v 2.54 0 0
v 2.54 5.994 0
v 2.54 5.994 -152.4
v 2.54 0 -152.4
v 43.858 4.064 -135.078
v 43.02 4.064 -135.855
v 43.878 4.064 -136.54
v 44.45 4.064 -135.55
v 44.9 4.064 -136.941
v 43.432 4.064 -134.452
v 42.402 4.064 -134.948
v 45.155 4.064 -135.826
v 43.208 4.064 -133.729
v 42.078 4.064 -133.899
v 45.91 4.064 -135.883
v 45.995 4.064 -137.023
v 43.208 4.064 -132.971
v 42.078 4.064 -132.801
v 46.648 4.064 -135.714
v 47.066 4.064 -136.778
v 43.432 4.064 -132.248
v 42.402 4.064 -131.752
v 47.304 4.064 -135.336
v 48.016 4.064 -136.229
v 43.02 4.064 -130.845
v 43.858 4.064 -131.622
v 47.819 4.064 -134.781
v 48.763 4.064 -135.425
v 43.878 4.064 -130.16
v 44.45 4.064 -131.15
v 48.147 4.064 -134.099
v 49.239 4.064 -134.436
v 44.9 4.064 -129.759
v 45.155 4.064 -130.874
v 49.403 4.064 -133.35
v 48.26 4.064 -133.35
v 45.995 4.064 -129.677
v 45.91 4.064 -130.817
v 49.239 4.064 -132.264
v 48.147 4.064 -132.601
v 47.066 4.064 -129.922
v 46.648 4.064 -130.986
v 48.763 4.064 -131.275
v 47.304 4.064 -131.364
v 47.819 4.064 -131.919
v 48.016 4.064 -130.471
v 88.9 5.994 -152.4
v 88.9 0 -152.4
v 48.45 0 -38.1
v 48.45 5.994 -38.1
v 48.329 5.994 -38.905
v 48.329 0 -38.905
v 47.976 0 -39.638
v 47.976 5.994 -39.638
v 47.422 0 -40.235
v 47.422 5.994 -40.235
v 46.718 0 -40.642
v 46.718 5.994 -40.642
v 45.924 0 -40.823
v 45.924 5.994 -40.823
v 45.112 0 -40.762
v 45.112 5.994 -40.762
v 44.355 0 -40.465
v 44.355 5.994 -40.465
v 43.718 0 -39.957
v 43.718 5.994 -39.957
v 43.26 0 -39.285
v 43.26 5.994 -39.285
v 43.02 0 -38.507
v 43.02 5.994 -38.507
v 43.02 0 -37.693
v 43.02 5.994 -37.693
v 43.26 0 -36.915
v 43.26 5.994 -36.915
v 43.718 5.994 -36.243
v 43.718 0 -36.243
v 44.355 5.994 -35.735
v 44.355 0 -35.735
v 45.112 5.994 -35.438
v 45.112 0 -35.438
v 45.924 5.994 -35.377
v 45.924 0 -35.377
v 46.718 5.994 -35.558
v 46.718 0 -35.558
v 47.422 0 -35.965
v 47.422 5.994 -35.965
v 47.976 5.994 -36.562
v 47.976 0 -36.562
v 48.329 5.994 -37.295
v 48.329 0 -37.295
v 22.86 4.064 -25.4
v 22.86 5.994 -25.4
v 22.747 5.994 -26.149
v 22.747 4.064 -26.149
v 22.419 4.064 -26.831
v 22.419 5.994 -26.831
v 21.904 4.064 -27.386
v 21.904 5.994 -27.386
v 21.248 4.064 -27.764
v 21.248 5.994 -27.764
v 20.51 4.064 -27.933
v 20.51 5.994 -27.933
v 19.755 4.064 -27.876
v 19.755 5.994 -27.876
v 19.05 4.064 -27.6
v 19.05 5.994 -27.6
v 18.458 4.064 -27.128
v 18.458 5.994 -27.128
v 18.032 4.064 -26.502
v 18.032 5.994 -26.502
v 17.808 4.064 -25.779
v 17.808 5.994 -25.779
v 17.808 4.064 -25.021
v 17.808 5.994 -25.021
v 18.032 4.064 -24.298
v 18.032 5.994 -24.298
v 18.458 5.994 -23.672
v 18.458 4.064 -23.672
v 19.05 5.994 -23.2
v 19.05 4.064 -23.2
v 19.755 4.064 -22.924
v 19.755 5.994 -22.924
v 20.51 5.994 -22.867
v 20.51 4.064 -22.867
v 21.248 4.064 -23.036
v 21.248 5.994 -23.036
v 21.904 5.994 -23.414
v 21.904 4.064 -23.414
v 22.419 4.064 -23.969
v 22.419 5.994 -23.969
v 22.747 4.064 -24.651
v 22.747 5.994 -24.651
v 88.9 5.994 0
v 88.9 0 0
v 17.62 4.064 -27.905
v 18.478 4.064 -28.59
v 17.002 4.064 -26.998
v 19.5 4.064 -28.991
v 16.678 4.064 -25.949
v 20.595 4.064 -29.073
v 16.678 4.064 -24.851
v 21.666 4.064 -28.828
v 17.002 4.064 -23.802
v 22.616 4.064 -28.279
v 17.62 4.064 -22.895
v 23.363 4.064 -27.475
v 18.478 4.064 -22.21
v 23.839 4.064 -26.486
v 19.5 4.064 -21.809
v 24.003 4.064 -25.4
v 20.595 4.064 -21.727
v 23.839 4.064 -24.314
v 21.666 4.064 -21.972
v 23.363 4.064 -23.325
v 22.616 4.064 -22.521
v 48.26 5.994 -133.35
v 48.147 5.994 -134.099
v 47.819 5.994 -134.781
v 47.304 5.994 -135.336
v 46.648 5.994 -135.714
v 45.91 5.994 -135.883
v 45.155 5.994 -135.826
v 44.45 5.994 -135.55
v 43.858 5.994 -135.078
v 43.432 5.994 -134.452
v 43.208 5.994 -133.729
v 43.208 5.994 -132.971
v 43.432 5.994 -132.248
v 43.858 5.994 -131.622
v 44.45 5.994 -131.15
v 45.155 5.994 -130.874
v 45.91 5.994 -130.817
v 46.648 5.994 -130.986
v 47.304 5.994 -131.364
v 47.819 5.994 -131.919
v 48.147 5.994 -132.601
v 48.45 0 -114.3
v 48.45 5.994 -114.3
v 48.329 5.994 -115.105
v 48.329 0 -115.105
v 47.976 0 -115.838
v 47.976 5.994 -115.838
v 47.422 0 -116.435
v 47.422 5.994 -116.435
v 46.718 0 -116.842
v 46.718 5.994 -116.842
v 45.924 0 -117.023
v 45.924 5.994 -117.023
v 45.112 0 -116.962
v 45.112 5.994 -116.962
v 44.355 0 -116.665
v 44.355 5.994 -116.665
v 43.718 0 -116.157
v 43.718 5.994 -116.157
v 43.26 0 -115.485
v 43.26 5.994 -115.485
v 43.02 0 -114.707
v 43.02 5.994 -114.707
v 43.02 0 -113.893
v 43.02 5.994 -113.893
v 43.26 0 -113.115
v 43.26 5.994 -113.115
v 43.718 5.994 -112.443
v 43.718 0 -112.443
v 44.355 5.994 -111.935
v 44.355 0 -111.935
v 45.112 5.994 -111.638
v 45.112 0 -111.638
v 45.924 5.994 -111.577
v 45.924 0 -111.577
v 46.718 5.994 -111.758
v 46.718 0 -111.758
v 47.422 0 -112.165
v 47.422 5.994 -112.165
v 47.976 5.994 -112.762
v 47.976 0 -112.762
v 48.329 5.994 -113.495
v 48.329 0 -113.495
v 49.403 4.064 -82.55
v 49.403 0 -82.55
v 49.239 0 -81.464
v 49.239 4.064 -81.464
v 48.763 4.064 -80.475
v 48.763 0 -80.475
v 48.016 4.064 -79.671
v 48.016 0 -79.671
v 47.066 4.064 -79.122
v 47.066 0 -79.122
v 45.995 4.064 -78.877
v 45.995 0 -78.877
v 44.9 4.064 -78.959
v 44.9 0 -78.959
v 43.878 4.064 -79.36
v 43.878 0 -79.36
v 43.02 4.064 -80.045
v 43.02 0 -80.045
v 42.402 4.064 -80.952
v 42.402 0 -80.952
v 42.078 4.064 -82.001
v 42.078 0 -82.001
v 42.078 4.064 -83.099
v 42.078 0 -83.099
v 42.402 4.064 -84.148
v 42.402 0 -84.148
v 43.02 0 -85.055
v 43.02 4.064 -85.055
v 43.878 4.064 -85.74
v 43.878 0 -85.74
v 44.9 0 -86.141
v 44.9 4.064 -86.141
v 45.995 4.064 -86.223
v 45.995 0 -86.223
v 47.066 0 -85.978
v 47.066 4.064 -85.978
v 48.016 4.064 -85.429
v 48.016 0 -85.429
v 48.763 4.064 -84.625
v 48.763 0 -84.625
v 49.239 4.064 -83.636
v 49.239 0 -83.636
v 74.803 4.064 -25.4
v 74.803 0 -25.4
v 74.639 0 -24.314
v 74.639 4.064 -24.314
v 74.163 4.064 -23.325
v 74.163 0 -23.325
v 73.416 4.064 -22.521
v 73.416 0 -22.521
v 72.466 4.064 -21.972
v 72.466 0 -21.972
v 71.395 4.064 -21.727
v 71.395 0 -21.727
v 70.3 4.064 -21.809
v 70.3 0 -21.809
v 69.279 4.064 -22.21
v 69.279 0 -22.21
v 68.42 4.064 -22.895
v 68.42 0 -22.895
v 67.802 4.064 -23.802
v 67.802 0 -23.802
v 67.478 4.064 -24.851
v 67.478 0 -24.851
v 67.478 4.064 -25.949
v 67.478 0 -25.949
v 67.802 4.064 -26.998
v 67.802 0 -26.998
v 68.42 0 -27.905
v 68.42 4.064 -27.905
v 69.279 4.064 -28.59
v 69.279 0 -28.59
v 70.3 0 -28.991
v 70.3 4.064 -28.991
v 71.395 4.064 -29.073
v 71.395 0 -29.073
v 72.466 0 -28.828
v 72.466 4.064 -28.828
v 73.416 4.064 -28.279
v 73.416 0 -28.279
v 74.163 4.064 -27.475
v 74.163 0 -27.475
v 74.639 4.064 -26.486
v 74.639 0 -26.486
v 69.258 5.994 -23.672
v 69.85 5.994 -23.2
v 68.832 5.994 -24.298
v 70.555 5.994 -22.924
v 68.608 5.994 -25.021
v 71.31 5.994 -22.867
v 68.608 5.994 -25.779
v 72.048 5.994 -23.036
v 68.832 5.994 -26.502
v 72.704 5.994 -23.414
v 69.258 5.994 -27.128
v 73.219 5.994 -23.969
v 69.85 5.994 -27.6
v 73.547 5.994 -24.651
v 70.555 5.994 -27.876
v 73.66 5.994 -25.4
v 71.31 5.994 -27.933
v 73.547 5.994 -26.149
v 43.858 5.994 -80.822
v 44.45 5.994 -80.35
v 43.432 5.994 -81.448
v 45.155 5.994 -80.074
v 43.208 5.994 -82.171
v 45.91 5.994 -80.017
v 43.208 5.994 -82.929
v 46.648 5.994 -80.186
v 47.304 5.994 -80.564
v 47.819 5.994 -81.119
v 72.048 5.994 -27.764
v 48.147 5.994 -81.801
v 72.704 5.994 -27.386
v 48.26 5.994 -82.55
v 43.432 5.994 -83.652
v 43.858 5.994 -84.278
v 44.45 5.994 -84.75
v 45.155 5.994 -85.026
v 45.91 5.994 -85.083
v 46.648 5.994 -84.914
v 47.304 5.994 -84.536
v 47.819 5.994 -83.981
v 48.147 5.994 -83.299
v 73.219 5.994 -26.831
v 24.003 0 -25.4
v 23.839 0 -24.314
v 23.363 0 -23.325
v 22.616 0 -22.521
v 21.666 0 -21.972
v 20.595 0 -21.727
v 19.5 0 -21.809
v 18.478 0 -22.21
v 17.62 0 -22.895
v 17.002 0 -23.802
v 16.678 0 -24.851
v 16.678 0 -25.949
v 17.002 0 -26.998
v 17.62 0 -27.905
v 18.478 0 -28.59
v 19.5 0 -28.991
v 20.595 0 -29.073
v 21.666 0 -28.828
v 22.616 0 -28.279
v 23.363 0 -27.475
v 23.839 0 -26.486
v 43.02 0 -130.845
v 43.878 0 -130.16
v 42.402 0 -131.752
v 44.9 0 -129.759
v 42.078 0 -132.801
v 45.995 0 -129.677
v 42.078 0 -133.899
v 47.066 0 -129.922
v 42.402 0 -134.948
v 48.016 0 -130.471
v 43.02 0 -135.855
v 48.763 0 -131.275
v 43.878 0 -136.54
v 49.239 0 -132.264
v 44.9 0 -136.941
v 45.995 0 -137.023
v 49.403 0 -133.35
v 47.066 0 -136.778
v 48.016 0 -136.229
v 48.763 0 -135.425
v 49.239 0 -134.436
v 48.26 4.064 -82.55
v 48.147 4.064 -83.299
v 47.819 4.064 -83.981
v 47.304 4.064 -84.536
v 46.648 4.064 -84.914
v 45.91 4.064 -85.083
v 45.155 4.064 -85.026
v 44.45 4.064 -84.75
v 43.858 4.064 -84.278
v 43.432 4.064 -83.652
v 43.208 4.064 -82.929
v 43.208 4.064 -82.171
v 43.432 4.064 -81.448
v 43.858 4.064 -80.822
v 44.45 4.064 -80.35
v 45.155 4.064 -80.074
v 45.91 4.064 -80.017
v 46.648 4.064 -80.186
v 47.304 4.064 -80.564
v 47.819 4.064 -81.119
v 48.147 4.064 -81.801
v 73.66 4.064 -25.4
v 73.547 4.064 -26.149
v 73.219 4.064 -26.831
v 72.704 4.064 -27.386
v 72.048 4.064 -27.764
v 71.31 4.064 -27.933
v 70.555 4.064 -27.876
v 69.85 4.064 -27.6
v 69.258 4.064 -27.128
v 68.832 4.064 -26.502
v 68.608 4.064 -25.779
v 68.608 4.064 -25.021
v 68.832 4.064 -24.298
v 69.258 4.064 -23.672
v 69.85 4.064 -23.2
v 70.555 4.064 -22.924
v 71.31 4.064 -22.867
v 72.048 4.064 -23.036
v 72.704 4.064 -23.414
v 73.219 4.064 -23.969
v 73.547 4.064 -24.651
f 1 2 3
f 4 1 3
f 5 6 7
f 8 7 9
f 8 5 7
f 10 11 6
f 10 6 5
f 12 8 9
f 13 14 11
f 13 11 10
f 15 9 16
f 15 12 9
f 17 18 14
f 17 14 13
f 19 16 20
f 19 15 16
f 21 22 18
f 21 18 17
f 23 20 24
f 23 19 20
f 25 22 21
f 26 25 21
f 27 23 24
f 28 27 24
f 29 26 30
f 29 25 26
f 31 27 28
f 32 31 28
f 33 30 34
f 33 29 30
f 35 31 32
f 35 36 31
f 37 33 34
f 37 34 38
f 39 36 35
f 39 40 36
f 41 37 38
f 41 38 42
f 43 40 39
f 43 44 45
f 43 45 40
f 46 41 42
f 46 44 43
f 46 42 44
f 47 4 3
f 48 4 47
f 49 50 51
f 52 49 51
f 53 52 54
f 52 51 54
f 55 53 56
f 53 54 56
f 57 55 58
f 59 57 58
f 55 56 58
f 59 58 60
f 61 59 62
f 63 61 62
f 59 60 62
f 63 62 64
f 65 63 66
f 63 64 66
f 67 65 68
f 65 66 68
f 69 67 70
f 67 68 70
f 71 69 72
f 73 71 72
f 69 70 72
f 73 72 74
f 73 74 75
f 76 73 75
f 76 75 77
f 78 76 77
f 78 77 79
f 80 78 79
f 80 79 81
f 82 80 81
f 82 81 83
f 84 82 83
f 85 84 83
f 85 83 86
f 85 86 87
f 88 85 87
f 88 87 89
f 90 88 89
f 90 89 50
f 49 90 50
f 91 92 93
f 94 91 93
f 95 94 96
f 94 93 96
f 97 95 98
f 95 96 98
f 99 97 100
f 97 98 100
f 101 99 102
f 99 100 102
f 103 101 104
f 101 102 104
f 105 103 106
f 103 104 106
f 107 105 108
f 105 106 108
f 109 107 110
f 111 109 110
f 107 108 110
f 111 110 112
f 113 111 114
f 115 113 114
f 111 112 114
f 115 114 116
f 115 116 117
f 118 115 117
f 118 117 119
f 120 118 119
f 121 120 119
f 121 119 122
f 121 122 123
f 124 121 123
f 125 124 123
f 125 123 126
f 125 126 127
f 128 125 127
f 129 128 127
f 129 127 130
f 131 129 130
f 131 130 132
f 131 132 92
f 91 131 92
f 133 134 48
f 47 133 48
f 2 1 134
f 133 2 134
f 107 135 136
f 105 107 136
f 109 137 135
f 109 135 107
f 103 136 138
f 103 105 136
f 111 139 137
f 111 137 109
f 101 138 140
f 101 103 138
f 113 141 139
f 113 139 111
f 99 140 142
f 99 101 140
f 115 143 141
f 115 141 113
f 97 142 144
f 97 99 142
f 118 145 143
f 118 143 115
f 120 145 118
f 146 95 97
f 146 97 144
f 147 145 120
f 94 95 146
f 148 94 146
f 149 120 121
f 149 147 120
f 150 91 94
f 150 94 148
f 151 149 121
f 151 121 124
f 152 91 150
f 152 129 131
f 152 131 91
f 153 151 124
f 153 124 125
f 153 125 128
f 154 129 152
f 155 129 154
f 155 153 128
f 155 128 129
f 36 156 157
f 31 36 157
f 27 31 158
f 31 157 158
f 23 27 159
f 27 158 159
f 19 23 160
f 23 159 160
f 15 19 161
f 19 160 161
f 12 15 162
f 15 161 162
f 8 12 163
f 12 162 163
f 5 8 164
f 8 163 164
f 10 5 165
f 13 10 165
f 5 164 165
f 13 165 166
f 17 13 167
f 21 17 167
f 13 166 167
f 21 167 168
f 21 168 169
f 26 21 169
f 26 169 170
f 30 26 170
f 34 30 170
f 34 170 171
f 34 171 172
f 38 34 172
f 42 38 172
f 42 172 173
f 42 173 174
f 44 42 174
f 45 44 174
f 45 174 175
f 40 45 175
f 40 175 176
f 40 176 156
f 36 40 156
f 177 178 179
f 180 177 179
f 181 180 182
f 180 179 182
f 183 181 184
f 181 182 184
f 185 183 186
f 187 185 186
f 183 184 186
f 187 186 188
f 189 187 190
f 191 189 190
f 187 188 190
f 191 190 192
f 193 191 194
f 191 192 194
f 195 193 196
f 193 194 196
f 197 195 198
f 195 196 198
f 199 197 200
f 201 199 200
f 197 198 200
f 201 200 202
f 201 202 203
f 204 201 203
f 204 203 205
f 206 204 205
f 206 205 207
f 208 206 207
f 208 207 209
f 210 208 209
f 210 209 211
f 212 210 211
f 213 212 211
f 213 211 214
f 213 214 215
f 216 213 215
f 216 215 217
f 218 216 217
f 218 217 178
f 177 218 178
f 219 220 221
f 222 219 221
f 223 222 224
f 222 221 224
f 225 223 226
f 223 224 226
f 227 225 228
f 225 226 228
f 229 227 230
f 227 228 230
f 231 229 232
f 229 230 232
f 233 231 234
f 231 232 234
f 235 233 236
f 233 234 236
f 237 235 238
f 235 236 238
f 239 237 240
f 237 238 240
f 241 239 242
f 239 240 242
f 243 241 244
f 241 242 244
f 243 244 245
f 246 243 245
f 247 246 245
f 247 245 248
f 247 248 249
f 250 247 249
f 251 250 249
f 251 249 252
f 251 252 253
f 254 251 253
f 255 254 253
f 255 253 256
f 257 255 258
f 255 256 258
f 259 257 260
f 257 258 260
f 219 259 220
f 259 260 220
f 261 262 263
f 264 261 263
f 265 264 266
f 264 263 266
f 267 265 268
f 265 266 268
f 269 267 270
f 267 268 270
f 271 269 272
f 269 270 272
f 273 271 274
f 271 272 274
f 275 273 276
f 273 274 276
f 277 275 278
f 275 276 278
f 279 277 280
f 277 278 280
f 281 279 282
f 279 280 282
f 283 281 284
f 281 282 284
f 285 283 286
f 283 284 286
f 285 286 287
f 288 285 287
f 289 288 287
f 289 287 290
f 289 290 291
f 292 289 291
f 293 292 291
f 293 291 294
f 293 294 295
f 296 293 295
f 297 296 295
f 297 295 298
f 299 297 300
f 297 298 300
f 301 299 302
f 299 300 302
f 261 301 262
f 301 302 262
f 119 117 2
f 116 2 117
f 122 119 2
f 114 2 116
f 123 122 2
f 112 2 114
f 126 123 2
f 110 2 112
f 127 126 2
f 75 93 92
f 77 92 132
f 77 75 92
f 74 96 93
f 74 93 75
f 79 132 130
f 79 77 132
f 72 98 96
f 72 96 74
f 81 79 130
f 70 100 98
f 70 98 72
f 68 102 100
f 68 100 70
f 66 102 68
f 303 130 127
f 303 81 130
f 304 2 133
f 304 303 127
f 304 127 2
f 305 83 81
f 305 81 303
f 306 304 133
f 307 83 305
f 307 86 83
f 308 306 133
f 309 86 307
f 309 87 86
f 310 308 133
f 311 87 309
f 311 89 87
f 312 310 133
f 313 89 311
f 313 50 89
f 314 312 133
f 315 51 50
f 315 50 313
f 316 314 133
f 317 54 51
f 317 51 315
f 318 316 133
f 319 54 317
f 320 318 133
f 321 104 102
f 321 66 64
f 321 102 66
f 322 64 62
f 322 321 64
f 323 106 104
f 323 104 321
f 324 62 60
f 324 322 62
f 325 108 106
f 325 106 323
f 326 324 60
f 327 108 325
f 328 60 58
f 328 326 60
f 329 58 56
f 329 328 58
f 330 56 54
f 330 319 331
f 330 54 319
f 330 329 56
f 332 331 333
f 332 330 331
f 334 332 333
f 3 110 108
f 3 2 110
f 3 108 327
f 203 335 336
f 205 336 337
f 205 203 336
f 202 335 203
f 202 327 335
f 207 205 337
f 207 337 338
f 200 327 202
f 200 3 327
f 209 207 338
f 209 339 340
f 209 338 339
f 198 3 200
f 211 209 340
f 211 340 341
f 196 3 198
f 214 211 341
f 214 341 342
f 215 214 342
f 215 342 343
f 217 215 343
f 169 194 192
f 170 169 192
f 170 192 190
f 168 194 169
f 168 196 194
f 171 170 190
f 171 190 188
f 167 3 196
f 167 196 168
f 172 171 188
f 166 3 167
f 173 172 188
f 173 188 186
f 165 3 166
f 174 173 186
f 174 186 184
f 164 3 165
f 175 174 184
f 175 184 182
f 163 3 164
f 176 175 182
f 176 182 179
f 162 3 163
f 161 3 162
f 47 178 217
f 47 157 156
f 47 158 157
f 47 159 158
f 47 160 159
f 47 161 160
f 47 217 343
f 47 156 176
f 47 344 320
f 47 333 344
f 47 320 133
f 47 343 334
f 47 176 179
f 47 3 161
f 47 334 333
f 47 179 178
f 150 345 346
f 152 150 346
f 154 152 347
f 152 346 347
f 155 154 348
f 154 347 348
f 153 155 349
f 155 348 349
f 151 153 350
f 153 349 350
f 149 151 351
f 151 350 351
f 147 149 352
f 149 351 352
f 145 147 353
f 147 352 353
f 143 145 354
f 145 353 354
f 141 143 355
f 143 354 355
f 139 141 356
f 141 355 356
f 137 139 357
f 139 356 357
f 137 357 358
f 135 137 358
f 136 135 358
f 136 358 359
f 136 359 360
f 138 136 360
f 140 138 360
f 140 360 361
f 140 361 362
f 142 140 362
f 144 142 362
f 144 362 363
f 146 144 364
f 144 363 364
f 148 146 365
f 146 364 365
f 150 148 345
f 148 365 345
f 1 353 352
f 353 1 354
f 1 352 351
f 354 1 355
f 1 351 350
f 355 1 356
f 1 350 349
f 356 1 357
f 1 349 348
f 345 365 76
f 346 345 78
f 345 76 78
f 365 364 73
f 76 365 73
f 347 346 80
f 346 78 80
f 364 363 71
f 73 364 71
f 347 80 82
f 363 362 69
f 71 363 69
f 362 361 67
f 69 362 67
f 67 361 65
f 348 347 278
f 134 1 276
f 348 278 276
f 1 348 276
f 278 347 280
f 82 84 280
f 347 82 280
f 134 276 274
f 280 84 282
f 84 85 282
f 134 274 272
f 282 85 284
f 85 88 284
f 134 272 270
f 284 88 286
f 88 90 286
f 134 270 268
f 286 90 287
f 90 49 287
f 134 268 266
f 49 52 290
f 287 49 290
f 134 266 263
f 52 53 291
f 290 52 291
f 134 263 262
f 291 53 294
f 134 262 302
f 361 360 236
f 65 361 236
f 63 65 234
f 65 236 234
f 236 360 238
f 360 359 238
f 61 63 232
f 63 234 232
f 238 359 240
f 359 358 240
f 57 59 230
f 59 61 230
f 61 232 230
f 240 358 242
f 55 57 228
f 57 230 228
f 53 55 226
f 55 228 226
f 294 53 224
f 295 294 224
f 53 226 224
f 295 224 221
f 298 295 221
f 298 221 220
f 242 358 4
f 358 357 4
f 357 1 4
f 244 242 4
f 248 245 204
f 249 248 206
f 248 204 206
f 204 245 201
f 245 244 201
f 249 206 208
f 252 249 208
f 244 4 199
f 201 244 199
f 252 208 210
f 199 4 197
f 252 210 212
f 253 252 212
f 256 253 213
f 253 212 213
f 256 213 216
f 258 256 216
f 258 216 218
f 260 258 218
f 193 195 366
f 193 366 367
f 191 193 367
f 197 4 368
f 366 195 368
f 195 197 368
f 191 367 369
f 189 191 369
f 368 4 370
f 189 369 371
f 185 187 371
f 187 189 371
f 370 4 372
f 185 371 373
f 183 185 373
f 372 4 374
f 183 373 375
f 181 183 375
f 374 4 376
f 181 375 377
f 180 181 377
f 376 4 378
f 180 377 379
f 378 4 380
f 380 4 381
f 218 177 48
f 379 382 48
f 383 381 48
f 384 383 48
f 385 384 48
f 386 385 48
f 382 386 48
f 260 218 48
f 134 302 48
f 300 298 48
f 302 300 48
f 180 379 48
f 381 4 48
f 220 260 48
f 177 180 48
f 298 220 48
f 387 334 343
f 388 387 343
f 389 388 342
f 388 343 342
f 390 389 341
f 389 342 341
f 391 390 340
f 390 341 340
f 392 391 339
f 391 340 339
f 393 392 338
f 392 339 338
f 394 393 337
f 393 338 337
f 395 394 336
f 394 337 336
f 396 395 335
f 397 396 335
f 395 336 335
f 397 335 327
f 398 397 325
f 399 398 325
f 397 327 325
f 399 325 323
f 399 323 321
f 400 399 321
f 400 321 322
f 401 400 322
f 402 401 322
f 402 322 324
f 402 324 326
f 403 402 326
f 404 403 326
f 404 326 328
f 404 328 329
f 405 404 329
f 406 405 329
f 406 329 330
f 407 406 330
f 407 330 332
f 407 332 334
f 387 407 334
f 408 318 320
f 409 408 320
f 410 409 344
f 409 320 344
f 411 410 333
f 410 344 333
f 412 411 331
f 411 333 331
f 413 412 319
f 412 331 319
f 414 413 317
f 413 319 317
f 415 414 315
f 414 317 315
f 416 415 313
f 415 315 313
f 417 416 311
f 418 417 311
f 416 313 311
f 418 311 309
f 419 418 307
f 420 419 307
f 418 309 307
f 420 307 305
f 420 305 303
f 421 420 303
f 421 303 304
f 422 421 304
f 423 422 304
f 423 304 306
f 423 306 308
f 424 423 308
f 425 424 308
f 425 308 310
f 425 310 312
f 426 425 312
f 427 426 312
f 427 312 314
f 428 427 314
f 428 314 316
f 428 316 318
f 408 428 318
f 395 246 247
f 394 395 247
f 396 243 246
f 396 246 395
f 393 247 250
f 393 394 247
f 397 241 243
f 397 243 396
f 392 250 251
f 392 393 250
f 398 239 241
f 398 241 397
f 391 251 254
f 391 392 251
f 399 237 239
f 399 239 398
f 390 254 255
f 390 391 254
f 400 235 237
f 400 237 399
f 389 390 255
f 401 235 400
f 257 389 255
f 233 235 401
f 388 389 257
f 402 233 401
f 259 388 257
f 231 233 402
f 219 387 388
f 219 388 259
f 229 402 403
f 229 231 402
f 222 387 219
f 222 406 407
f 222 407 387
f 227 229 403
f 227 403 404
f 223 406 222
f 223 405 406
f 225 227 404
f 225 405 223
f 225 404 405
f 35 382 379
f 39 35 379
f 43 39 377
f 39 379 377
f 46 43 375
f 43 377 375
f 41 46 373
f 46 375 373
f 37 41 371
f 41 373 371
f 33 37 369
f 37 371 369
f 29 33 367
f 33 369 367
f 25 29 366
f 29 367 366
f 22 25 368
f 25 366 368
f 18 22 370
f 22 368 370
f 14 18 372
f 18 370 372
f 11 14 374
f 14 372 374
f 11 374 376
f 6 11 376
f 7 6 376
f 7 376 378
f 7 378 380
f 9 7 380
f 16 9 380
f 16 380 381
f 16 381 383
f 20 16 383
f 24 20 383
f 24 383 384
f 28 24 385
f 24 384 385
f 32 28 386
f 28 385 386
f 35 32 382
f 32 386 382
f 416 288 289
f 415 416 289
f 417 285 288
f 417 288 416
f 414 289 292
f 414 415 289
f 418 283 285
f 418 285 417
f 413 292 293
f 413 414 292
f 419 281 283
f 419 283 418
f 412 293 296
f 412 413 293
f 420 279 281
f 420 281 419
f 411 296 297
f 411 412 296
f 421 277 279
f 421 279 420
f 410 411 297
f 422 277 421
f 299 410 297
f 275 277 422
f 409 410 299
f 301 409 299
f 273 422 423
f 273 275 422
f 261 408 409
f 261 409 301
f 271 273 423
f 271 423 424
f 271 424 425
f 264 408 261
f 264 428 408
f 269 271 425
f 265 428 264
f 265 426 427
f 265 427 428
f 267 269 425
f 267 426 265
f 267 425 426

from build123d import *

# Parameters (mm, degrees)
SKETCH2_W               = 88.9
SKETCH2_H               = 152.4
BOSS_EXTRUDE1_DEPTH     = 5.9944
SKETCH4_R               = 2.7305
CUT_EXTRUDE2_DEPTH      = 1
CUT_EXTRUDE2_DEPTH_BACK = 6.9944
SKETCH7_W               = 2.54
SKETCH7_H               = 152.4
CUT_EXTRUDE3_DEPTH      = 1
CUT_EXTRUDE3_DEPTH_BACK = 6.9944
SKETCH8_R               = 2.54
CUT_EXTRUDE4_DEPTH      = 1
CUT_EXTRUDE4_DEPTH_BACK = 6.9944
SKETCH9_R               = 3.683
CUT_EXTRUDE5_DEPTH      = 4.064


with BuildPart() as part:
    # Sketch2 → Boss-Extrude1 (new body)
    with BuildSketch(Plane(origin=(0, 0, 0), x_dir=(1, 0, 0), z_dir=(0, 1, 0))):
        with Locations((44.45, 76.2)):
            Rectangle(SKETCH2_W, SKETCH2_H)
    extrude(amount=BOSS_EXTRUDE1_DEPTH)

    # Sketch4 → Cut-Extrude2 (cut, two sides)
    with BuildSketch(Plane(origin=(0, 5.9944, 0), x_dir=(1, 0, 0), z_dir=(0, 1, 0))) as cut_extrude2_sk:
        with Locations((45.72, 114.3)):
            Circle(SKETCH4_R)
        with Locations((45.72, 38.1)):
            Circle(SKETCH4_R)
    extrude(amount=CUT_EXTRUDE2_DEPTH, mode=Mode.SUBTRACT)
    extrude(cut_extrude2_sk.sketch, amount=-CUT_EXTRUDE2_DEPTH_BACK, mode=Mode.SUBTRACT)

    # Sketch7 → Cut-Extrude3 (cut, two sides)
    with BuildSketch(Plane(origin=(0, 5.9944, 0), x_dir=(1, 0, 0), z_dir=(0, 1, 0))) as cut_extrude3_sk:
        with Locations((1.27, 76.2)):
            Rectangle(SKETCH7_W, SKETCH7_H)
    extrude(amount=CUT_EXTRUDE3_DEPTH, mode=Mode.SUBTRACT)
    extrude(cut_extrude3_sk.sketch, amount=-CUT_EXTRUDE3_DEPTH_BACK, mode=Mode.SUBTRACT)

    # Sketch8 → Cut-Extrude4 (cut, two sides)
    with BuildSketch(Plane(origin=(0, 5.9944, 0), x_dir=(1, 0, 0), z_dir=(0, 1, 0))) as cut_extrude4_sk:
        with Locations((20.32, 25.4)):
            Circle(SKETCH8_R)
        with Locations((71.12, 25.4)):
            Circle(SKETCH8_R)
        with Locations((45.72, 82.55)):
            Circle(SKETCH8_R)
        with Locations((45.72, 133.35)):
            Circle(SKETCH8_R)
    extrude(amount=CUT_EXTRUDE4_DEPTH, mode=Mode.SUBTRACT)
    extrude(cut_extrude4_sk.sketch, amount=-CUT_EXTRUDE4_DEPTH_BACK, mode=Mode.SUBTRACT)

    # Sketch9 → Cut-Extrude5 (cut)
    with BuildSketch(Plane.XZ):
        with Locations((20.32, -25.4)):
            Circle(SKETCH9_R)
        with Locations((71.12, -25.4)):
            Circle(SKETCH9_R)
        with Locations((45.72, -82.55)):
            Circle(SKETCH9_R)
        with Locations((45.72, -133.35)):
            Circle(SKETCH9_R)
    extrude(amount=-CUT_EXTRUDE5_DEPTH, mode=Mode.SUBTRACT)


solid = part.part
